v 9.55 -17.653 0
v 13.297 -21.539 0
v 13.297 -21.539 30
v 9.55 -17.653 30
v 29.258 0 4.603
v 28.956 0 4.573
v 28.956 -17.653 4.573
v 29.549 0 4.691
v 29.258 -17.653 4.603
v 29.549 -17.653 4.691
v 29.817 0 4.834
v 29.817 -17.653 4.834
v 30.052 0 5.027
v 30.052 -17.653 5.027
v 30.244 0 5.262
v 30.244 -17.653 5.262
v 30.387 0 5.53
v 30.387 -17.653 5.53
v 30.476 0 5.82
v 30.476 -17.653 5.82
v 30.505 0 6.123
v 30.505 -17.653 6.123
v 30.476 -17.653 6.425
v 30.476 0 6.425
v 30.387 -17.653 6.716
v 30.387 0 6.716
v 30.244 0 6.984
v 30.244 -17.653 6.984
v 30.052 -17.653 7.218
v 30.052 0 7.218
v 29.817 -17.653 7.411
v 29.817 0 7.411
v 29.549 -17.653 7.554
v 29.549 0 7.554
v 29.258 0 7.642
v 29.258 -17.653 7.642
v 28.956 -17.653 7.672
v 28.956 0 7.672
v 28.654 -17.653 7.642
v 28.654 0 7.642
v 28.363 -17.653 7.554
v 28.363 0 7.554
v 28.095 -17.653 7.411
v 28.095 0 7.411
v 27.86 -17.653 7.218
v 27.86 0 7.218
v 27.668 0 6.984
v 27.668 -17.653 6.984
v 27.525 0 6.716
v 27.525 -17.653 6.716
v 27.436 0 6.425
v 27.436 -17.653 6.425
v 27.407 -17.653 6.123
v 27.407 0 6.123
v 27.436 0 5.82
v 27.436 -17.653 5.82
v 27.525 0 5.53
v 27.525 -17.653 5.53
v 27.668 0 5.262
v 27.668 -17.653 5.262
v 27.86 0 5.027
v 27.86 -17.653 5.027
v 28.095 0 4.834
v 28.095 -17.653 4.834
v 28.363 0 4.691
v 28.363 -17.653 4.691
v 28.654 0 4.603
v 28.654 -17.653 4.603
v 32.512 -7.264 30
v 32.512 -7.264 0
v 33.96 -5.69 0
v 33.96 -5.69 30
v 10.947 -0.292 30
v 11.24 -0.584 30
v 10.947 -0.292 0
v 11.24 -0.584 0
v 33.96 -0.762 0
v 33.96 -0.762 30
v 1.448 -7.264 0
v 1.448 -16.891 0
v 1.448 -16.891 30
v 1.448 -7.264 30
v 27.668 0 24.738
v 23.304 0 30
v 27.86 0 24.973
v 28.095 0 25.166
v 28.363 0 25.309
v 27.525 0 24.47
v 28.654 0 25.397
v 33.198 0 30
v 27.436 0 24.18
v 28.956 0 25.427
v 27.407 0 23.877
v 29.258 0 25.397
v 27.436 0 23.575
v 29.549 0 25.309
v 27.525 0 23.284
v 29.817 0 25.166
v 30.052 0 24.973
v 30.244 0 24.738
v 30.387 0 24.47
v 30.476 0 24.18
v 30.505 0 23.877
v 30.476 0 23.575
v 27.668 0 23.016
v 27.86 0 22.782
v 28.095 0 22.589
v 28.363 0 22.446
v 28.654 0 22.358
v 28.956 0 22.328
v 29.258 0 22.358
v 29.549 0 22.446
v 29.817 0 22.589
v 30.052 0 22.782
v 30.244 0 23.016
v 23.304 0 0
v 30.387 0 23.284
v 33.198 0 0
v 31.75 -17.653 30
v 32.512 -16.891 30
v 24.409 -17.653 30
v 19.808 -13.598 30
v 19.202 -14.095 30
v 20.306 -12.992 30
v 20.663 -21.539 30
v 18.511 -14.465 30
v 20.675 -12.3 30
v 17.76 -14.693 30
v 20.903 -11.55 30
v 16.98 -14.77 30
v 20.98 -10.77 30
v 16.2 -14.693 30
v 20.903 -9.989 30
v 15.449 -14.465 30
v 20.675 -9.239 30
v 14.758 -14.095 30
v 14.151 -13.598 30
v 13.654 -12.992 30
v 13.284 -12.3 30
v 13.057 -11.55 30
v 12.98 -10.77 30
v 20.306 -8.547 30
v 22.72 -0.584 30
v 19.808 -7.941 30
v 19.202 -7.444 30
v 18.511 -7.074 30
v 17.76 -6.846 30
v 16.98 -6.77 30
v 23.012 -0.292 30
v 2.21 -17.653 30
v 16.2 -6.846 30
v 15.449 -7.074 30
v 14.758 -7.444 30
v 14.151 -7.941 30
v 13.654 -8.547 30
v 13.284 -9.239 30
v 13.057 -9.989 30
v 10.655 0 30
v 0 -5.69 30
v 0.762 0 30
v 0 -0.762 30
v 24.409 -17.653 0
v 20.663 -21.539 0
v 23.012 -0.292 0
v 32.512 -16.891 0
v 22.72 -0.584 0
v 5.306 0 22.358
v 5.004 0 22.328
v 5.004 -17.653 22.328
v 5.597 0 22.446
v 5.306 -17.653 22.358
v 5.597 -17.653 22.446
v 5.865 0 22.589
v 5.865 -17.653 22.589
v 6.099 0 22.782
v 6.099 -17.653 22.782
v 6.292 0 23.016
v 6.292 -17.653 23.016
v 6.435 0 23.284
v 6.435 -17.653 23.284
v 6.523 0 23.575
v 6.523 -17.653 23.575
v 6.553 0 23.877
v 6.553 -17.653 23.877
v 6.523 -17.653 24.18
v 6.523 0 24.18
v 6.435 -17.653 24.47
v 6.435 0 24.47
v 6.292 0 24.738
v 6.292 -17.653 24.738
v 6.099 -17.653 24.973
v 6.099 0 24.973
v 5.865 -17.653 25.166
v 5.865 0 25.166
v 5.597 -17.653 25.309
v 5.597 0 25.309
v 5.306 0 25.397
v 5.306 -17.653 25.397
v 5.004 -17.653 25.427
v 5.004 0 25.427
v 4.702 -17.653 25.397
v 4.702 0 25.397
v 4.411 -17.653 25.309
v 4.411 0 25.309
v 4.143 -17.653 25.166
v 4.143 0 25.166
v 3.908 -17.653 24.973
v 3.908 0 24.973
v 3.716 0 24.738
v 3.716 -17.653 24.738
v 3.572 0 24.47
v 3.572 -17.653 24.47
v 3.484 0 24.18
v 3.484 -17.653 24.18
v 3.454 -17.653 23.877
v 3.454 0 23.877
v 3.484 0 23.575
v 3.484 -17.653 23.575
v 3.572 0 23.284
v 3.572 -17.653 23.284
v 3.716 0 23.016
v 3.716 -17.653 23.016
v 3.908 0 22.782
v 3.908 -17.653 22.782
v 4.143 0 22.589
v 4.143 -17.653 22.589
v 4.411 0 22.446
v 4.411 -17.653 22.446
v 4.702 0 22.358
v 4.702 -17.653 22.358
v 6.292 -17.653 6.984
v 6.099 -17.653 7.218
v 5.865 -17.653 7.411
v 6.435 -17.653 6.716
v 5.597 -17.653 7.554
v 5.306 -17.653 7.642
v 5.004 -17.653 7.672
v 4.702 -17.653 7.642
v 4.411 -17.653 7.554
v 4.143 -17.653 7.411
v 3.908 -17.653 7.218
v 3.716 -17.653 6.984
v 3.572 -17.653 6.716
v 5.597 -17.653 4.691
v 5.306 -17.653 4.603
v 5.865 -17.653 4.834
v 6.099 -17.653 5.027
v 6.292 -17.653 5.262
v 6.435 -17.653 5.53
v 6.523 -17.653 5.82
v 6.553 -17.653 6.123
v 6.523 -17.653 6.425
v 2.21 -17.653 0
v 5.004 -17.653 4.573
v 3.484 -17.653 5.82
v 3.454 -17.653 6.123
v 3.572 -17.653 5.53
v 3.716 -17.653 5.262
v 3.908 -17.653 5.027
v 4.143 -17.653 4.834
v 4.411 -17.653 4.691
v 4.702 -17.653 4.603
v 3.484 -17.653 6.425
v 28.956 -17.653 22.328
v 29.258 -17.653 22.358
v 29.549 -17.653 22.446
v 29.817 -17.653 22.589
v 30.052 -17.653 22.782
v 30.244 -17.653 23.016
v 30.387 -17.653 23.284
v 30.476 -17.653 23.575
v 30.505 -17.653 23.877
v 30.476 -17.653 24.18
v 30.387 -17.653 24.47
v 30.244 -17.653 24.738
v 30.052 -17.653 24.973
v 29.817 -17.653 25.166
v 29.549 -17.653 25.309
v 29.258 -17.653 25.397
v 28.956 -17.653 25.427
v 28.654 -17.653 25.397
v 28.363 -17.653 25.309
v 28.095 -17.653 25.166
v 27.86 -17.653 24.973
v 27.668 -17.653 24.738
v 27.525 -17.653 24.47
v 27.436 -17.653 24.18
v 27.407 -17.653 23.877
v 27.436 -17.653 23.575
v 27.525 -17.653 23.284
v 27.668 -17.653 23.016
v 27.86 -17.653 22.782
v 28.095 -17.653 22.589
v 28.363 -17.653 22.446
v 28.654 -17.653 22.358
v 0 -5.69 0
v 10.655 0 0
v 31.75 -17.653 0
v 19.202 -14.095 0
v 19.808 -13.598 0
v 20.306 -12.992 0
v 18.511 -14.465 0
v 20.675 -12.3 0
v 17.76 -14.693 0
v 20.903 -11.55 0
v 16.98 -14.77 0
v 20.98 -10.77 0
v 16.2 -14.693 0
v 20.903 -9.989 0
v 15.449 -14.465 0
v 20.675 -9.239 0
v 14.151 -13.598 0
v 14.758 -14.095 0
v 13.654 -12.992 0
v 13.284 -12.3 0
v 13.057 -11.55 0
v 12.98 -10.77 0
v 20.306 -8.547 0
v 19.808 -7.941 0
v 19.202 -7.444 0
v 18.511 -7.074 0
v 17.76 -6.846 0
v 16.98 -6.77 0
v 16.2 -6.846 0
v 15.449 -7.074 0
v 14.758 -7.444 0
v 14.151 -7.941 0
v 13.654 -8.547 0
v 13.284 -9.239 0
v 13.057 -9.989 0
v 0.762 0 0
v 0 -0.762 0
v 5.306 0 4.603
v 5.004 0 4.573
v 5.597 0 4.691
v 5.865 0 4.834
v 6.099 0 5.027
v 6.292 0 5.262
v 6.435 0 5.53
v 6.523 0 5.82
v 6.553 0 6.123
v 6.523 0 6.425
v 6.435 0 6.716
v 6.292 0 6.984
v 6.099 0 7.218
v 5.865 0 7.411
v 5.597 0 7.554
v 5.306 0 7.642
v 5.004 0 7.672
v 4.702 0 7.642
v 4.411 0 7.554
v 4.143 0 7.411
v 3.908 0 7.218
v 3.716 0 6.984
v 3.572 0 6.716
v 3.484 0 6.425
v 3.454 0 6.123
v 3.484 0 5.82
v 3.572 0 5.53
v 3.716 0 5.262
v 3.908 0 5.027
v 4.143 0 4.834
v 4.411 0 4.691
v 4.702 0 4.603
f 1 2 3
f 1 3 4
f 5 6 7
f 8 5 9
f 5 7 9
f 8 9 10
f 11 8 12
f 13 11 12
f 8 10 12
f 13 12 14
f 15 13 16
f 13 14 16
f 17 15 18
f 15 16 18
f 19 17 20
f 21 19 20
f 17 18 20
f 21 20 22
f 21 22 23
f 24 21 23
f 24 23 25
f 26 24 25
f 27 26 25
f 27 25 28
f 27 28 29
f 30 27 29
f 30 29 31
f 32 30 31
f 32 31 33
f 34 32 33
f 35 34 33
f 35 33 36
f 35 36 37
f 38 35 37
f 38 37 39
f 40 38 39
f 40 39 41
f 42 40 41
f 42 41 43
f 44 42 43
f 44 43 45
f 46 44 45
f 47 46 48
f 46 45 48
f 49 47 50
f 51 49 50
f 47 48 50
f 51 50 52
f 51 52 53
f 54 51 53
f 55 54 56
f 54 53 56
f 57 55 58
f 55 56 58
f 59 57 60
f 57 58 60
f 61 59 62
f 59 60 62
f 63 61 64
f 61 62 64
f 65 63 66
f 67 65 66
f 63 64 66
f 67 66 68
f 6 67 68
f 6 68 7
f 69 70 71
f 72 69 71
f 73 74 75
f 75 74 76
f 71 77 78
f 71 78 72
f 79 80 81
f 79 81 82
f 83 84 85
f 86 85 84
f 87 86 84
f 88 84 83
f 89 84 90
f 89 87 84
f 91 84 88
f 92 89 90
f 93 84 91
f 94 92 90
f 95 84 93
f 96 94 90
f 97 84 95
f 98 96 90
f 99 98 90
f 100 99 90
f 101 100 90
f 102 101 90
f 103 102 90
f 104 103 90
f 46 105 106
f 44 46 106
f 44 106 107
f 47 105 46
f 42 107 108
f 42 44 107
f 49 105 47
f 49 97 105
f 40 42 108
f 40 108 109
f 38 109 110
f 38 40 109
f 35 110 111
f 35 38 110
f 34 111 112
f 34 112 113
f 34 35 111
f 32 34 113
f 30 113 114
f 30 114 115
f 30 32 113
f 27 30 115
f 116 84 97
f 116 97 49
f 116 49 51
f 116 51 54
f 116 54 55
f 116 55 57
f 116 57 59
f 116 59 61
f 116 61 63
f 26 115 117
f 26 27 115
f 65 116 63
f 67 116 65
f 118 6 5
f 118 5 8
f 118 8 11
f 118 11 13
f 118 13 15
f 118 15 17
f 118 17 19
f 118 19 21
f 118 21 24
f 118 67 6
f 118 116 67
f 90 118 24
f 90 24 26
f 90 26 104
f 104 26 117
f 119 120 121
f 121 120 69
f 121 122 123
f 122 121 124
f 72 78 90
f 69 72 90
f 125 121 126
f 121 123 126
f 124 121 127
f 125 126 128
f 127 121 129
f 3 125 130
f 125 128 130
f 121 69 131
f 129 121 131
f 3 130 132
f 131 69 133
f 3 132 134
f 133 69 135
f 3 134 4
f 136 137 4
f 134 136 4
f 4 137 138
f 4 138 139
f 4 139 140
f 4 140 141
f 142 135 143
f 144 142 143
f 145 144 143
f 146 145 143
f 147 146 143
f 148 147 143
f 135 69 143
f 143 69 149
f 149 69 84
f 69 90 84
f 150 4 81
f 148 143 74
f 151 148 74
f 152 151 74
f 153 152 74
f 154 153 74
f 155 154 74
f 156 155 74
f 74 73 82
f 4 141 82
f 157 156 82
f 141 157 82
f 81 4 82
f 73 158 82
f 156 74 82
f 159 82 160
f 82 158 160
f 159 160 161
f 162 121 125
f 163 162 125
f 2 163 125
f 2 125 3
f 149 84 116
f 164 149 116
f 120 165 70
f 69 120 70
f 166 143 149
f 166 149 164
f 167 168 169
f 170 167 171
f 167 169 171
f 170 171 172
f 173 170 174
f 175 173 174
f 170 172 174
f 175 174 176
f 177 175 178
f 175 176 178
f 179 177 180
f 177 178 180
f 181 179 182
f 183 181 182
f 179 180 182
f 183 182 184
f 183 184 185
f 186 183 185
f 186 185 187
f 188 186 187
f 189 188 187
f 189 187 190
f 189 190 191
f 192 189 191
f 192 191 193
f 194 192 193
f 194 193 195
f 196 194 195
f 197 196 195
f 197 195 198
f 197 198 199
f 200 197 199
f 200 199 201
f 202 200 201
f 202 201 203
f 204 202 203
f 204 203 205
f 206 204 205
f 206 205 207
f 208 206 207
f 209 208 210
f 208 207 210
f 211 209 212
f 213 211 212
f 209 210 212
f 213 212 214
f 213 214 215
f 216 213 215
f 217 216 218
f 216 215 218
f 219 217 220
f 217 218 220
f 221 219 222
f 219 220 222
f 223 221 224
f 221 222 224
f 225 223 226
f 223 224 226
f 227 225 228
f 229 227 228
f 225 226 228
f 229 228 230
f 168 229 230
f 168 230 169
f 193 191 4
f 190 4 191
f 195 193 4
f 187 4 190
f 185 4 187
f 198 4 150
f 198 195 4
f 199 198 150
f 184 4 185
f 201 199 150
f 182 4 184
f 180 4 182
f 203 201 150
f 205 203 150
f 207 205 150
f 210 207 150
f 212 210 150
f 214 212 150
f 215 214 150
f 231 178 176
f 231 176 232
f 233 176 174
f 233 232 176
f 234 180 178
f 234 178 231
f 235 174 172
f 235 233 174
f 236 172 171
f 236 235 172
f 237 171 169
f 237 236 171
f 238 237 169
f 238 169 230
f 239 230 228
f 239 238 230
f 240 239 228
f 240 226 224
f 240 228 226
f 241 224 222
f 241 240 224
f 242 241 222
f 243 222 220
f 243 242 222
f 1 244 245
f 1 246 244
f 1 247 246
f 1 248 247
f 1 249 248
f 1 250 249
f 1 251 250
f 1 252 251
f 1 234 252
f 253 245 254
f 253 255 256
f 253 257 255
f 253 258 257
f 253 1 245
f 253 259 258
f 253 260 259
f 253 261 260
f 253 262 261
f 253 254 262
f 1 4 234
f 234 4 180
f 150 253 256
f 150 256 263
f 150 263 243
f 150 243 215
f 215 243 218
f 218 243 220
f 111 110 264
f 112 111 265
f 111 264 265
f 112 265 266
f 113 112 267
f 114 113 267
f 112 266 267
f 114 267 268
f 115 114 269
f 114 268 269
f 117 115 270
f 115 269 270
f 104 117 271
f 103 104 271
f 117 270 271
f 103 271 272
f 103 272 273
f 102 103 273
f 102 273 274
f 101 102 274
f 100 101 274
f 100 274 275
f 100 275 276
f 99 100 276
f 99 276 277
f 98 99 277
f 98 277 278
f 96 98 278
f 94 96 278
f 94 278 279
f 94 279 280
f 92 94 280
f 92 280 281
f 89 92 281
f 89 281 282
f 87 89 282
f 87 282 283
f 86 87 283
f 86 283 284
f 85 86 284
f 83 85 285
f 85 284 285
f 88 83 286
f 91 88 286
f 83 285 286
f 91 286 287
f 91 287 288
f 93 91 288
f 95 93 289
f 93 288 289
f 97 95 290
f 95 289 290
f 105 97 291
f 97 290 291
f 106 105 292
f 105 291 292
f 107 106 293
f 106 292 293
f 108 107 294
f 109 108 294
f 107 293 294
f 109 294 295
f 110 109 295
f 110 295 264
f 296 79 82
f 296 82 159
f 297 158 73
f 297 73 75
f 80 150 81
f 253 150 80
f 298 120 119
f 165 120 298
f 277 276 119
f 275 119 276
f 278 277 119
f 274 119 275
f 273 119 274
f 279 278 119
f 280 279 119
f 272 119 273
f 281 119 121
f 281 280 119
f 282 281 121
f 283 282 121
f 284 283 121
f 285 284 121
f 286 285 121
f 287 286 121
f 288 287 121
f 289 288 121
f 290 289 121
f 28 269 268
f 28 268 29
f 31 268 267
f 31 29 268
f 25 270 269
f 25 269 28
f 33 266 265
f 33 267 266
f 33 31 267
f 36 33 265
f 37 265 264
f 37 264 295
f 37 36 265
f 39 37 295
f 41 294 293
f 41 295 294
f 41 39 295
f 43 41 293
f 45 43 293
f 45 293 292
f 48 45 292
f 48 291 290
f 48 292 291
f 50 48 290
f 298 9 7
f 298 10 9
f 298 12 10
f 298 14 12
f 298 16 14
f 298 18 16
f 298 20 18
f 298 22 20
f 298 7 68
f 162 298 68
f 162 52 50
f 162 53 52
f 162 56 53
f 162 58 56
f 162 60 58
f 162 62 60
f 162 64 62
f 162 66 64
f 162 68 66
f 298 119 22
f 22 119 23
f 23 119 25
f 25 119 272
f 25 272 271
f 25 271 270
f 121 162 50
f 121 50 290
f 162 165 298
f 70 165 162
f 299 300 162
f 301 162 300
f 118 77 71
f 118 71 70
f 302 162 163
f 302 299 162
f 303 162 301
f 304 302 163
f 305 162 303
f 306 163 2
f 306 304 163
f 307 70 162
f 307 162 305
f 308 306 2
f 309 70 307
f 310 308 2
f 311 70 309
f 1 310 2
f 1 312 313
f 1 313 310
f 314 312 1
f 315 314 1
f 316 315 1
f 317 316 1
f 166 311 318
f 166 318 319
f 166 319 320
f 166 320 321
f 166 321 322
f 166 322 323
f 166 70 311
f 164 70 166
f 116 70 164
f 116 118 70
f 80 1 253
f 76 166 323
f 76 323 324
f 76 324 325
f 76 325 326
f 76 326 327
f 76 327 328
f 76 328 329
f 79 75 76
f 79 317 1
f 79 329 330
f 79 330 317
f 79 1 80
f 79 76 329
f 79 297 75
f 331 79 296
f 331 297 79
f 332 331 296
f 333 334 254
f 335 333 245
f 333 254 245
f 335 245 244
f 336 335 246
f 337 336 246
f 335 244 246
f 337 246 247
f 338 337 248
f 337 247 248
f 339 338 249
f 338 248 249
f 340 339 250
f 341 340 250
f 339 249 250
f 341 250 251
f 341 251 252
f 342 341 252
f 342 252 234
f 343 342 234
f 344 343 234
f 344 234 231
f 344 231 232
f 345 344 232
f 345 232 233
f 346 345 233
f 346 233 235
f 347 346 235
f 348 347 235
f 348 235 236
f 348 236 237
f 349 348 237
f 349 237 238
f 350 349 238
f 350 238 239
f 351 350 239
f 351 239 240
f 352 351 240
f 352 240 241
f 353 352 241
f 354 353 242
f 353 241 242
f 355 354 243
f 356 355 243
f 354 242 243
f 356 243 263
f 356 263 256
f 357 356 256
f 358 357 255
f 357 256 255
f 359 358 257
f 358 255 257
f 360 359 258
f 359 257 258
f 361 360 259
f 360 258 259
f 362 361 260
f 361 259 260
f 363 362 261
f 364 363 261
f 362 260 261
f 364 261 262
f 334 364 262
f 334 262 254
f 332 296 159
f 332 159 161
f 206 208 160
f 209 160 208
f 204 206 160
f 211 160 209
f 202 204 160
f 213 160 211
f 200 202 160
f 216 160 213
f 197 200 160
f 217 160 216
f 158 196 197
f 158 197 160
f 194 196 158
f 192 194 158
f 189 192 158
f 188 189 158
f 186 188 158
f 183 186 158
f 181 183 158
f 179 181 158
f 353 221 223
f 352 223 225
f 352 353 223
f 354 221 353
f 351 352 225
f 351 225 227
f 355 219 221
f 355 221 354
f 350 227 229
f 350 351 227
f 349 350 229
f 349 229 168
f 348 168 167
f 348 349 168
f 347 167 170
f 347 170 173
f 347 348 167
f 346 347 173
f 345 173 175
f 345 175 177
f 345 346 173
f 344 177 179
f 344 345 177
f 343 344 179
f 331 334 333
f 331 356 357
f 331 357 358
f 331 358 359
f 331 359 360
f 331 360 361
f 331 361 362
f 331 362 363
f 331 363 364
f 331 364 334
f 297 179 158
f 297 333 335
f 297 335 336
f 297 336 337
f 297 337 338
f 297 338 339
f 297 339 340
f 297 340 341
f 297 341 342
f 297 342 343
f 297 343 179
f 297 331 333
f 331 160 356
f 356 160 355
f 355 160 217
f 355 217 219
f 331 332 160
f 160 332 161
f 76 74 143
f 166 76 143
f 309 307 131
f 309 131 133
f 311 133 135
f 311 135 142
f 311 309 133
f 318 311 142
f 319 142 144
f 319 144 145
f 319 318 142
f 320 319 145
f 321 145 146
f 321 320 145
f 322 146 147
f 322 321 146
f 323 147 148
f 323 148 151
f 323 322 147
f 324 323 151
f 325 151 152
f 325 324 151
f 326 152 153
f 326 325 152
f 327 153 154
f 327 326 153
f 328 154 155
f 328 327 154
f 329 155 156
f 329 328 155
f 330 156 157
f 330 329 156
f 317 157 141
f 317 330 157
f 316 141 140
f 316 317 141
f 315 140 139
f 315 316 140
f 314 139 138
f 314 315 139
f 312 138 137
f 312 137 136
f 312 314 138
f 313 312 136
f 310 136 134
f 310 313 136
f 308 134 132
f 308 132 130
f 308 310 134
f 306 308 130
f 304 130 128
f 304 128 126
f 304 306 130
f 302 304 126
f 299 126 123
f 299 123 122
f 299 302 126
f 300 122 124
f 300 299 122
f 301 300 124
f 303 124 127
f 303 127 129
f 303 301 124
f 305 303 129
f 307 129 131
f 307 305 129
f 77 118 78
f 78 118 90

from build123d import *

# Parameters (mm, degrees)
SKETCH1_R           = 4
BOSS_EXTRUDE1_DEPTH = 30
SKETCH2_R           = 1.5494
CUT_EXTRUDE1_DEPTH  = 49.630200751
SKETCH3_W           = 12.065
SKETCH3_H           = 30
CUT_EXTRUDE2_DEPTH  = 0.5842
CHAMFER1_SIZE       = 0.2921
CUT_EXTRUDE3_DEPTH  = 51.171756524
CHAMFER2_SIZE       = 0.762


with BuildPart() as part:
    # Sketch1 → Boss-Extrude1 (new body)
    with BuildSketch(Plane.XY):
        Polygon((0, 0), (33.9598, 0), (33.9598, -17.653), (24.4094, -17.653), (20.6629, -21.5392), (13.2969, -21.5392), (9.5504, -17.653), (0, -17.653), align=None)
        with Locations((16.9799, -10.7696)):
            Circle(SKETCH1_R, mode=Mode.SUBTRACT)
    extrude(amount=BOSS_EXTRUDE1_DEPTH)

    # Sketch2 → Cut-Extrude1 (cut, through all)
    with BuildSketch(Plane(origin=(0, -17.653, 0), x_dir=(-1, 0, 0), z_dir=(0, -1, 0))):
        with Locations(Location((-5.0038, -23.8773, 0), (0, 0, 90))):
            Circle(SKETCH2_R)
        with Locations(Location((-5.0038, -6.1227, 0), (0, 0, 90))):
            Circle(SKETCH2_R)
        with Locations(Location((-28.956, -6.1227, 0), (0, 0, 90))):
            Circle(SKETCH2_R)
        with Locations(Location((-28.956, -23.8773, 0), (0, 0, 90))):
            Circle(SKETCH2_R)
    extrude(amount=-CUT_EXTRUDE1_DEPTH, mode=Mode.SUBTRACT)

    # Sketch3 → Cut-Extrude2 (cut)
    with BuildSketch(Plane(origin=(0, 0, 0), x_dir=(1, 0, 0), z_dir=(0, 1, 0))):
        with Locations((16.9799, -15)):
            Rectangle(SKETCH3_W, SKETCH3_H)
    extrude(amount=-CUT_EXTRUDE2_DEPTH, mode=Mode.SUBTRACT)

    # Chamfer1
    chamfer1_edges = [part.edges().sort_by_distance(p)[0] for p in [
        (23.0124, -0.5842, 15),
        (10.9474, -0.5842, 15),
    ]]
    chamfer(chamfer1_edges, length=CHAMFER1_SIZE)
    chamfer1_2_edges = [part.edges().sort_by_distance(p)[0] for p in [
        (23.0124, 0, 15),
        (10.9474, 0, 15),
    ]]
    chamfer(chamfer1_2_edges, length=CHAMFER1_SIZE - 0.0001)  # a hair under: the kernel refuses the full size

    # Sketch4 → Cut-Extrude3 (cut, through all)
    with BuildSketch(Plane.XY.offset(30)):
        Polygon((1.4478, -17.653), (1.4478, -7.2644), (0, -5.6896), (0, -17.653), align=None)
    cut_extrude3 = extrude(amount=-CUT_EXTRUDE3_DEPTH, mode=Mode.SUBTRACT)

    # Mirror1: Cut-Extrude3 across plane
    add(cut_extrude3.mirror(Plane.ZY.offset(-16.9799)), mode=Mode.SUBTRACT)

    # Chamfer2
    chamfer2_edges = [part.edges().sort_by_distance(p)[0] for p in [
        (32.512, -17.653, 15),
        (0, 0, 15),
        (33.9598, 0, 15),
        (1.4478, -17.653, 15),
    ]]
    chamfer(chamfer2_edges, length=CHAMFER2_SIZE)


solid = part.part
